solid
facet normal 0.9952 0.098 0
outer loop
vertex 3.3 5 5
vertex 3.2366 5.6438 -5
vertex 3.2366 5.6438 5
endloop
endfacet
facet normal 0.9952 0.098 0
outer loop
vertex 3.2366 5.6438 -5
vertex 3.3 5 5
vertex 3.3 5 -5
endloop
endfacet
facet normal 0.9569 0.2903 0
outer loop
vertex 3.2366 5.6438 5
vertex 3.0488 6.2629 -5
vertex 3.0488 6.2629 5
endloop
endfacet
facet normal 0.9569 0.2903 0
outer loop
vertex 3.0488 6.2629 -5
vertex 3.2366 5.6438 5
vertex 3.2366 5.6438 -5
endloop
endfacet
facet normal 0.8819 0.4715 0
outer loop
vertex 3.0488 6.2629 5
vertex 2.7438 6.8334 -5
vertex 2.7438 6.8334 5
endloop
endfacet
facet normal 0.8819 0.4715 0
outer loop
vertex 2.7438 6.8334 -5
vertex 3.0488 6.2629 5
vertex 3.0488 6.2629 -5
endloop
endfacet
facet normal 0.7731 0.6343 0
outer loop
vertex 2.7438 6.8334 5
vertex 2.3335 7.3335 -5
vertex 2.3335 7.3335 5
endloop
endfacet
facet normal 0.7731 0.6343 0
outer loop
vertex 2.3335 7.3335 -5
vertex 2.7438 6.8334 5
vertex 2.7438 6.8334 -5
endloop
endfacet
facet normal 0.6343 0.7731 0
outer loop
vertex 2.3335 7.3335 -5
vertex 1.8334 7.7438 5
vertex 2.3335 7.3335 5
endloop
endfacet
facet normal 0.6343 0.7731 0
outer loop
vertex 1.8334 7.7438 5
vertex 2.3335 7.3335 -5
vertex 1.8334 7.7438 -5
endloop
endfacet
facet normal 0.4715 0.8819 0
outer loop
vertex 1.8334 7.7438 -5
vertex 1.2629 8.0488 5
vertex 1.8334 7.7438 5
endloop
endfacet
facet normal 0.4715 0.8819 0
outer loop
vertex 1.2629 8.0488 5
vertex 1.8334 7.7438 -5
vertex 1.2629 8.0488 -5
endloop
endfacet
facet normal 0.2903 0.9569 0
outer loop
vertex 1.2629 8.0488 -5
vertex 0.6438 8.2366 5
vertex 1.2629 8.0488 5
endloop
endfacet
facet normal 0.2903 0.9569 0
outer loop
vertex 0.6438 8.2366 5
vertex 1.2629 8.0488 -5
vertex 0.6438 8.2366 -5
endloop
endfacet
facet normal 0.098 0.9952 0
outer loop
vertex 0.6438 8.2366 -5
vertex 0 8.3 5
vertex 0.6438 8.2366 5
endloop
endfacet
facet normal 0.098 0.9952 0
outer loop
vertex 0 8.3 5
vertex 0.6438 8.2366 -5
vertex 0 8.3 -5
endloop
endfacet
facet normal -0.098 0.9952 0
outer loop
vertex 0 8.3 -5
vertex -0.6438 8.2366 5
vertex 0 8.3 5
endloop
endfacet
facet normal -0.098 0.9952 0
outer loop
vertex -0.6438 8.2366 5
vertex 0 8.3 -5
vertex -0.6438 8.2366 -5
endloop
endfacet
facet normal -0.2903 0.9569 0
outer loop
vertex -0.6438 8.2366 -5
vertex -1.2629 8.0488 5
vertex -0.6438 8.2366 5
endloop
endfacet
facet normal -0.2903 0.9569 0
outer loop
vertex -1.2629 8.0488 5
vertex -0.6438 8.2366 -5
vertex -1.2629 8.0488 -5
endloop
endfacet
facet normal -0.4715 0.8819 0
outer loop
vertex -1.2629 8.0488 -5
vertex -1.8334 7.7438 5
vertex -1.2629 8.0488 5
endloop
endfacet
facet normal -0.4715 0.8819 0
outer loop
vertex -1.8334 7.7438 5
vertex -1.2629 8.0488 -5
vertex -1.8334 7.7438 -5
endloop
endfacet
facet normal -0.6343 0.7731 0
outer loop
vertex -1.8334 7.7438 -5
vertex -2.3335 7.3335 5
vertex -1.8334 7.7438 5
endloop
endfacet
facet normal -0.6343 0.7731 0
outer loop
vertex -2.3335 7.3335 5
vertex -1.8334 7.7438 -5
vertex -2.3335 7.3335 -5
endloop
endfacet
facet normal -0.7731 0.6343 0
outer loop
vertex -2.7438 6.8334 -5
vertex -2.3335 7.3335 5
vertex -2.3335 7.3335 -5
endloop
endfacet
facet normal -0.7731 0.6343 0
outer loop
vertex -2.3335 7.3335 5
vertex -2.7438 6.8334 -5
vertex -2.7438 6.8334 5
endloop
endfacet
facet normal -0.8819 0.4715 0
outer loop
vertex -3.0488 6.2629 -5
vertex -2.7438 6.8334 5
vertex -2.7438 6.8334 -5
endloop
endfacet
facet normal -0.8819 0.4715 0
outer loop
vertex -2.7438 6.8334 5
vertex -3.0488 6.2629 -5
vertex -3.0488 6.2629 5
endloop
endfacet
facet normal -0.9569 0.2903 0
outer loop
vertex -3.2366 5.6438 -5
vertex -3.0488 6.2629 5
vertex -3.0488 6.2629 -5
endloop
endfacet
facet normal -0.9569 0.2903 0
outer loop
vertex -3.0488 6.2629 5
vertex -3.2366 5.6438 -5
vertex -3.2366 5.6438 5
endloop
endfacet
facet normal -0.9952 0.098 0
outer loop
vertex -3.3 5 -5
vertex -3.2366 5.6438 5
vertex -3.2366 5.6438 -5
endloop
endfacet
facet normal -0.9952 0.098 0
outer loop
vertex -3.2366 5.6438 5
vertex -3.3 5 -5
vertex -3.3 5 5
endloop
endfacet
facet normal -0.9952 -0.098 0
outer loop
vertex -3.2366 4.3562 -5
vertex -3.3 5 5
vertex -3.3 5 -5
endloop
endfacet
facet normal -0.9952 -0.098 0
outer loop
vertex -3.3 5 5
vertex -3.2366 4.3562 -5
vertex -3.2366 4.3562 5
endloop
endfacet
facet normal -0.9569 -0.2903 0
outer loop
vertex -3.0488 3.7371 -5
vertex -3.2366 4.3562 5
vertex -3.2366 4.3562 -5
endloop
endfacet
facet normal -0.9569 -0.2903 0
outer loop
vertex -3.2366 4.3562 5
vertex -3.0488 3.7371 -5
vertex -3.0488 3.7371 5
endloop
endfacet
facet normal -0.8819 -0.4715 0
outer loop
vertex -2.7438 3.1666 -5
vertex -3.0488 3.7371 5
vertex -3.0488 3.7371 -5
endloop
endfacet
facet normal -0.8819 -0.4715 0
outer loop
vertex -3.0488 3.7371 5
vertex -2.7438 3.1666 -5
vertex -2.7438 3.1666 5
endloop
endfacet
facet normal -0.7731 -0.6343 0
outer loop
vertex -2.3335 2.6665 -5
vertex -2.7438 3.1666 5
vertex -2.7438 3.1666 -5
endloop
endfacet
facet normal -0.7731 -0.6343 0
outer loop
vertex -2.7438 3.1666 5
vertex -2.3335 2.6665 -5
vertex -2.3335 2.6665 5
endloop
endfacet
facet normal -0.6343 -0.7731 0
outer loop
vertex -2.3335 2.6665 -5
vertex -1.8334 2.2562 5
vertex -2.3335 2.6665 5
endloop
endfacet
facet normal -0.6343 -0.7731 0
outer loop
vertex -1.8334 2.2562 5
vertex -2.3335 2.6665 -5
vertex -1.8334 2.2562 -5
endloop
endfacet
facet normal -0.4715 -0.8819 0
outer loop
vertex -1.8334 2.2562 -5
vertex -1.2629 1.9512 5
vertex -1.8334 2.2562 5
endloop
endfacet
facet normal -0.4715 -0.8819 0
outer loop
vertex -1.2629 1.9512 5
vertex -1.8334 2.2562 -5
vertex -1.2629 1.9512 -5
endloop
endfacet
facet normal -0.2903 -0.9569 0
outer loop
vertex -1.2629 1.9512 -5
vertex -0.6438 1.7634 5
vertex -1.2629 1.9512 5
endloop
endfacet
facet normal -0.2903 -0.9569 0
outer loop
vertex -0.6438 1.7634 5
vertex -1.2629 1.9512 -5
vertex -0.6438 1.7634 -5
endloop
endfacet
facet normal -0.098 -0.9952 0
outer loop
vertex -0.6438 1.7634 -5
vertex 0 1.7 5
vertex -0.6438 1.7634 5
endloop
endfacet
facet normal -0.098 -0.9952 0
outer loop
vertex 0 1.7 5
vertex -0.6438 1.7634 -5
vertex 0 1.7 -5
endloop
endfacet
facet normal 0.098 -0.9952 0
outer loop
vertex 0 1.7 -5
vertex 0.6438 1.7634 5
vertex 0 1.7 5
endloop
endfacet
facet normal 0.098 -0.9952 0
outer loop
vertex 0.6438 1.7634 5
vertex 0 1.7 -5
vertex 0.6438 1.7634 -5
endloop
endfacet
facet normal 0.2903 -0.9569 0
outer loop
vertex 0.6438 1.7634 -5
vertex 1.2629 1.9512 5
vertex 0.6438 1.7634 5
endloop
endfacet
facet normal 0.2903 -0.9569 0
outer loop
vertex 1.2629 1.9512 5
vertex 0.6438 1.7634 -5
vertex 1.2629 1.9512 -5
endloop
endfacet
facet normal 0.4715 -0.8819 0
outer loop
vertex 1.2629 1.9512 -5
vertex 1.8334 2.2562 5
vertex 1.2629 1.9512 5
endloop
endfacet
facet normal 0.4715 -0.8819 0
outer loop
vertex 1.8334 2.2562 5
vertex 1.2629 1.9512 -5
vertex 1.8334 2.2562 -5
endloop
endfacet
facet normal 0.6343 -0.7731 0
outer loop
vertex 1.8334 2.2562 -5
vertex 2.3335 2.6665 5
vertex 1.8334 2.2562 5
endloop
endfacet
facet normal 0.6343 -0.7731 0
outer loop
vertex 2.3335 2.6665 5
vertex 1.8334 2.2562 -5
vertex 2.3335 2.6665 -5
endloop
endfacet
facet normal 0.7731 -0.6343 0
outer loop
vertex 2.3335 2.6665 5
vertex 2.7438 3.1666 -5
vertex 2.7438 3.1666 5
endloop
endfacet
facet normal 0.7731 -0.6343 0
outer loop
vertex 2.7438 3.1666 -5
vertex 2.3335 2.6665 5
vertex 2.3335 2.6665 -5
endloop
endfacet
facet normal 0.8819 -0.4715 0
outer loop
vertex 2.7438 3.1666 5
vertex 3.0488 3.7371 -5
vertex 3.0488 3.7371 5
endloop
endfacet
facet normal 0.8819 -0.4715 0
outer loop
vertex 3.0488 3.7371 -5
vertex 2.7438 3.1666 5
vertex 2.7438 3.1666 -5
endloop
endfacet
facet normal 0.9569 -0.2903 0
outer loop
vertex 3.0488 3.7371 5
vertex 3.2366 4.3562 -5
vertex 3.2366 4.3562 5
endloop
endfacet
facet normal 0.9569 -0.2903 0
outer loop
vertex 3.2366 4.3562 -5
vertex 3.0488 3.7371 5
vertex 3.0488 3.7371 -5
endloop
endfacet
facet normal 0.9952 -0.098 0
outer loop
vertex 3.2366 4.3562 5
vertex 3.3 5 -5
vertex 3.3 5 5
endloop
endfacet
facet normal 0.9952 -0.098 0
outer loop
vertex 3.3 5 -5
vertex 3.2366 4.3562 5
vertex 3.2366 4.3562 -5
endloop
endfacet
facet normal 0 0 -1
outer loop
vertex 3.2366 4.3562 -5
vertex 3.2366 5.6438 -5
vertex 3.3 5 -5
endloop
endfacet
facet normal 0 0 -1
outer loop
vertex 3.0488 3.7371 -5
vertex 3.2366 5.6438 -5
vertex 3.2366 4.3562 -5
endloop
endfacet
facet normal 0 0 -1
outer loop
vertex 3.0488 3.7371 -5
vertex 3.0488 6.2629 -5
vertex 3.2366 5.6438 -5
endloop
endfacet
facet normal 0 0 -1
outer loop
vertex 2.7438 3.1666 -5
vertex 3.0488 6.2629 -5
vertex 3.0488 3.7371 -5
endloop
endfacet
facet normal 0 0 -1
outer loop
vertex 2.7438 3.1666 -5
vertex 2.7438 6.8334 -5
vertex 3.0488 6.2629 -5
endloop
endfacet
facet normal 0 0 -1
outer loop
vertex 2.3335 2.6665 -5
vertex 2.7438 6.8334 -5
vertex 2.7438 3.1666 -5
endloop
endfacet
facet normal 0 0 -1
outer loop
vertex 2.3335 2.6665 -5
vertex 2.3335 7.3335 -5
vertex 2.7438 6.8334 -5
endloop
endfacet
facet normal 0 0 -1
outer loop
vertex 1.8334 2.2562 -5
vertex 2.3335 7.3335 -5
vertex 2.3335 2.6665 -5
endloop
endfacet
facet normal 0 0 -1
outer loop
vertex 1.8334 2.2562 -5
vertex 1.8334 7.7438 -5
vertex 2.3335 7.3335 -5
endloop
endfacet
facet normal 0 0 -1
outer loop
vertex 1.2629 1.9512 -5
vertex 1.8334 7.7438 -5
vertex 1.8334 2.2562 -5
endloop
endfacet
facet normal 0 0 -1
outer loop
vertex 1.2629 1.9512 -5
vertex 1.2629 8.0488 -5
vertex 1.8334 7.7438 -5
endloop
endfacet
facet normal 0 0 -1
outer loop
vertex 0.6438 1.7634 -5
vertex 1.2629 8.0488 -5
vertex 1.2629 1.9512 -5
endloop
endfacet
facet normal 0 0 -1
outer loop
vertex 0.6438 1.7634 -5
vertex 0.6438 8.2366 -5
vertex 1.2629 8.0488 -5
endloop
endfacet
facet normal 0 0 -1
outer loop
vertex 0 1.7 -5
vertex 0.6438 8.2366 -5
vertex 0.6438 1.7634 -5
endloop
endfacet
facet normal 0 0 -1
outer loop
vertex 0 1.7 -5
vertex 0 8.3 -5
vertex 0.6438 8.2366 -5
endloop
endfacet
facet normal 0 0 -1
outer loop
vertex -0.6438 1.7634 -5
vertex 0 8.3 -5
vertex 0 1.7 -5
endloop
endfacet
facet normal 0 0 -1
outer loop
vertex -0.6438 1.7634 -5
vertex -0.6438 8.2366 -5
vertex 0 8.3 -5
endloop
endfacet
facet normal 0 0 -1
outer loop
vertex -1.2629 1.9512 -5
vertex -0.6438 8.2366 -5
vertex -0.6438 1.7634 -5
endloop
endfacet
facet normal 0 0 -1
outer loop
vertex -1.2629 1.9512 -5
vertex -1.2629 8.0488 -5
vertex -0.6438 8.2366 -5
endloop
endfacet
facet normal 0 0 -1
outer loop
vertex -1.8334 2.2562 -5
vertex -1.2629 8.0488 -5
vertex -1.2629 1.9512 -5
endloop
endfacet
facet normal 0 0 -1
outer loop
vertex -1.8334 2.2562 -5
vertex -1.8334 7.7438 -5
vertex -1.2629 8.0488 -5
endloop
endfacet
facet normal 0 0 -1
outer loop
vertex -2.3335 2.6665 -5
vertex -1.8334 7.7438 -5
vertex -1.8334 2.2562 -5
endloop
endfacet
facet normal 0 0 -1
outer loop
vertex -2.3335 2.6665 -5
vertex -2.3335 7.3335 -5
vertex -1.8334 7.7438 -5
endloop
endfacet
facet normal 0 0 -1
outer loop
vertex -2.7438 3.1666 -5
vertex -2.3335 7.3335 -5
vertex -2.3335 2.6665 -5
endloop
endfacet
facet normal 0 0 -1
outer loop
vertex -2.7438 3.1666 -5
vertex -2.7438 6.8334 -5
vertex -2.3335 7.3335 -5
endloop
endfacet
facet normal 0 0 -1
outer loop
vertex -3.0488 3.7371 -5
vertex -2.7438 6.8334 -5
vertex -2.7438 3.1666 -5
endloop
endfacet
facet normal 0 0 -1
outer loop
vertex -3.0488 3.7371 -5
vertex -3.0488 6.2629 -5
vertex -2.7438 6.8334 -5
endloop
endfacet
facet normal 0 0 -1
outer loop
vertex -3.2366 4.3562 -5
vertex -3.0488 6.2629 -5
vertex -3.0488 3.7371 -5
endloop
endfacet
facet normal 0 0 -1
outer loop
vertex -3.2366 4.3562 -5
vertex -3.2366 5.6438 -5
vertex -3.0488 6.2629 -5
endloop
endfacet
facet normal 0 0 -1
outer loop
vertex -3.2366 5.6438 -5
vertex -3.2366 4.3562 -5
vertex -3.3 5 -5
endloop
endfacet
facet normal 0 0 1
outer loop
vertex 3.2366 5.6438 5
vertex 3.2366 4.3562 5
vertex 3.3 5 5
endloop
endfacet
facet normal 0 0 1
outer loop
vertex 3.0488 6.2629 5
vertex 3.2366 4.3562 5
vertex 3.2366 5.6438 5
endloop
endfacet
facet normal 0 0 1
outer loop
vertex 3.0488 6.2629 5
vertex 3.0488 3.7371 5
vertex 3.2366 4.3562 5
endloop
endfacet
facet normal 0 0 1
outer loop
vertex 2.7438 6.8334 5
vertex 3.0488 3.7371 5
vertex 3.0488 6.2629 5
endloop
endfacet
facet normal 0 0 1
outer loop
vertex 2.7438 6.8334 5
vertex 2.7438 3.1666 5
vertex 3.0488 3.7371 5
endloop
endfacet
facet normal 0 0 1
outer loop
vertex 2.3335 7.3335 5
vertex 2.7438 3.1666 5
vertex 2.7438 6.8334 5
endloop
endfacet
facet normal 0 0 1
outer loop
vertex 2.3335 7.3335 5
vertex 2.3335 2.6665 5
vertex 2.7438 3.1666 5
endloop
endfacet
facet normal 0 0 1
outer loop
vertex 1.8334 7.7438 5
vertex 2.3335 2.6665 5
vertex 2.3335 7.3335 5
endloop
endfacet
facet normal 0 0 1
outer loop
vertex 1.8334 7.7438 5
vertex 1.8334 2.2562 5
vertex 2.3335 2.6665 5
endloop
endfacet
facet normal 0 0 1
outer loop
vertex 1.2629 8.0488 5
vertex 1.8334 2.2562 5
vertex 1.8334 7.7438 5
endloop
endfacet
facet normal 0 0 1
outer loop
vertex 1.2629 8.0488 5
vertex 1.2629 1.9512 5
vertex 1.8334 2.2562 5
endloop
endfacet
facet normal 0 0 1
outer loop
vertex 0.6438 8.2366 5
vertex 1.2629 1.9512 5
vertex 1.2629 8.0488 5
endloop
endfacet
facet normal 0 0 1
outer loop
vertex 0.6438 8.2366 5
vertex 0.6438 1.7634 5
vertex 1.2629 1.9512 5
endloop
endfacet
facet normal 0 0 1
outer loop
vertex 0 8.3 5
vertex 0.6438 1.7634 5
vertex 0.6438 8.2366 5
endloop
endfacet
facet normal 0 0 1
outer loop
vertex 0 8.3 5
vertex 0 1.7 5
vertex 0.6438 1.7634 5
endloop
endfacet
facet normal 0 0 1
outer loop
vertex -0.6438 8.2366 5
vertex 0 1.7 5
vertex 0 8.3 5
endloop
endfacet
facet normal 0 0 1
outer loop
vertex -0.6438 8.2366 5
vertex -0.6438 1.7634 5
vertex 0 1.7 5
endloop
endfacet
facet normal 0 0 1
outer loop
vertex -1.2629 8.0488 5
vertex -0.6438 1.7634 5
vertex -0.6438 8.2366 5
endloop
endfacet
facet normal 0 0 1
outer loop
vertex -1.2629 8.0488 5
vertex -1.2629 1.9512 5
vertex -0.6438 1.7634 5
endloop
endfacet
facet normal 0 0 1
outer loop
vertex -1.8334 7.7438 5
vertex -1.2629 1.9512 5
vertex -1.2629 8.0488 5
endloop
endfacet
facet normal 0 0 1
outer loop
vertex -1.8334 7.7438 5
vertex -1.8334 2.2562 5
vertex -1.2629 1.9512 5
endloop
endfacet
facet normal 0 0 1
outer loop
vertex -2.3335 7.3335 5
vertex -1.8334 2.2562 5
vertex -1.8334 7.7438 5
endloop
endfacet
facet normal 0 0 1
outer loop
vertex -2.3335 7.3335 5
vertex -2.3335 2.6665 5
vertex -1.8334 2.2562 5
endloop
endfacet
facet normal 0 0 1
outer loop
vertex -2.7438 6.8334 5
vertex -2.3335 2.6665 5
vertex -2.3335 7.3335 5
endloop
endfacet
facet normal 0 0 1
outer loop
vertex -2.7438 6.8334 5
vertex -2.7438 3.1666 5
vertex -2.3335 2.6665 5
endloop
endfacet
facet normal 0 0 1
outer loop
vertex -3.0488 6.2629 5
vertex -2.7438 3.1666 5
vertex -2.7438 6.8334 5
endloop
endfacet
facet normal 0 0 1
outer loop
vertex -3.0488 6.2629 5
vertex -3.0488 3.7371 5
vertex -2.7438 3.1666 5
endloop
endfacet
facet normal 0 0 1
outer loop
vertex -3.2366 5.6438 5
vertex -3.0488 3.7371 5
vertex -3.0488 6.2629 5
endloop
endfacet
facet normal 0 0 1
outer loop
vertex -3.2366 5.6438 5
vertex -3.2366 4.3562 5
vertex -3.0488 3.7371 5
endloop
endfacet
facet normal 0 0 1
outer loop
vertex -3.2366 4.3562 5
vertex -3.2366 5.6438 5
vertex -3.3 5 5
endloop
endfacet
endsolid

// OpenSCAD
$fn = 32;

Led5mm();

module Led5mm() {
    translate([  0, 5]) {
        cylinder(d=6.6, h=10, center=true);
    }
}
